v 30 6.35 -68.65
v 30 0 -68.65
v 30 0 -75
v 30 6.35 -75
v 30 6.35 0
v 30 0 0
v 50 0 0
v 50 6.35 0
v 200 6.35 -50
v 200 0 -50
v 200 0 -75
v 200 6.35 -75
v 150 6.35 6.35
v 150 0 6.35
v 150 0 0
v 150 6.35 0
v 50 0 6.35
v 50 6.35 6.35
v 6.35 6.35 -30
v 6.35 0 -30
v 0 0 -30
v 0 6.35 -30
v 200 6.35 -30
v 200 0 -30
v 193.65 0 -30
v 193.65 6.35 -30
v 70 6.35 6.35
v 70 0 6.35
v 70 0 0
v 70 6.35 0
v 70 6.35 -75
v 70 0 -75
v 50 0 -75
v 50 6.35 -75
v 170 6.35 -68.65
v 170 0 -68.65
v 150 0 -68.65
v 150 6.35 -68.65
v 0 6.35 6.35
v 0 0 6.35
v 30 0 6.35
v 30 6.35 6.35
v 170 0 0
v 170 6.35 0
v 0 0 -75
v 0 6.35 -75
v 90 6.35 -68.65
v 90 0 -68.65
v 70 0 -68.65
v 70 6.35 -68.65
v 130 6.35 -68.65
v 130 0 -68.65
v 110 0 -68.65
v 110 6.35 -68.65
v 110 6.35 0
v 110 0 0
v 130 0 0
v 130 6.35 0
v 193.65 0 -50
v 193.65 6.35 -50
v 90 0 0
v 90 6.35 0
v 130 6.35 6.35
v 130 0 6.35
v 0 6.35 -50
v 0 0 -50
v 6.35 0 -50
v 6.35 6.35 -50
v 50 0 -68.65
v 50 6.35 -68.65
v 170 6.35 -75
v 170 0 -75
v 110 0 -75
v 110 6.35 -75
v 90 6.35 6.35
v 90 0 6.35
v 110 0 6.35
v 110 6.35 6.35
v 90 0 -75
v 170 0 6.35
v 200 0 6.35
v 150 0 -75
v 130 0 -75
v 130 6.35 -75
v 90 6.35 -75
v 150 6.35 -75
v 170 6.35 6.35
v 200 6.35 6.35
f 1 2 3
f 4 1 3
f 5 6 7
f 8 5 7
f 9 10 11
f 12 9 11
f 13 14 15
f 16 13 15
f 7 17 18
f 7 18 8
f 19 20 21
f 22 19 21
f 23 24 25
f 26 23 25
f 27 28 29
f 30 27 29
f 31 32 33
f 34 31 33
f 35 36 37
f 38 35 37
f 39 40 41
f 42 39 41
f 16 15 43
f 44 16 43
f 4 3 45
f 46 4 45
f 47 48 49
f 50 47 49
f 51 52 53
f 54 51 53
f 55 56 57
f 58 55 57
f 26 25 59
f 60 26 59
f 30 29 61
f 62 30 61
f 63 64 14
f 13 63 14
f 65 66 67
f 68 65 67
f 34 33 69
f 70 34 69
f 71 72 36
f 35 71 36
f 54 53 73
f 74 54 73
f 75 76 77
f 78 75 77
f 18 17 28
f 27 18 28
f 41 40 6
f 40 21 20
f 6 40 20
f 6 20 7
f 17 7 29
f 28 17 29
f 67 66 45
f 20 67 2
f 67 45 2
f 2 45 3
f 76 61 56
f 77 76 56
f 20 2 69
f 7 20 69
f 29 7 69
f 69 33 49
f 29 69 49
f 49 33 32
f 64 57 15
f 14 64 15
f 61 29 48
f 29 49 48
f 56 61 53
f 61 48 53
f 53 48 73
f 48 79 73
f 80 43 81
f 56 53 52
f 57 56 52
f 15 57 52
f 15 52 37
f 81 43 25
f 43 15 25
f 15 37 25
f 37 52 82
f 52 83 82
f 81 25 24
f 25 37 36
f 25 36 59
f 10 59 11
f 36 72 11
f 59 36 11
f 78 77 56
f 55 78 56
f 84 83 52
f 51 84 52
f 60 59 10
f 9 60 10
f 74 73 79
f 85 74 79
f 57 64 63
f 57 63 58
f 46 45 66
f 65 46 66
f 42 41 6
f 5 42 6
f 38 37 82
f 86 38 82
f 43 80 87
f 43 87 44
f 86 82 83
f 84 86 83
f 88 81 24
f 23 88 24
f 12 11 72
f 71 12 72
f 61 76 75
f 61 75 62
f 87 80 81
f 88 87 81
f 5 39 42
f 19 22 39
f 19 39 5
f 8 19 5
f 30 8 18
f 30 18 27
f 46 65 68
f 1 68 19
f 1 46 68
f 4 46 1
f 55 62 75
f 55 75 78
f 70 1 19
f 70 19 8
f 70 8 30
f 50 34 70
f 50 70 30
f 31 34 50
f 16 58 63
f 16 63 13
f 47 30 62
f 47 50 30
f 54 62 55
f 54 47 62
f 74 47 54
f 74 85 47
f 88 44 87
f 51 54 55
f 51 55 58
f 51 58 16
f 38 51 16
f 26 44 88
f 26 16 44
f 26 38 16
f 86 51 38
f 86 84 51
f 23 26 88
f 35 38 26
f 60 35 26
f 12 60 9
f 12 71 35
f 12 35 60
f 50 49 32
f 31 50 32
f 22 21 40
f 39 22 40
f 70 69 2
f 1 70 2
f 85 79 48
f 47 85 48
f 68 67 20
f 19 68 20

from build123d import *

# Parameters (mm, degrees)
SKETCH1_W           = 30
SKETCH1_H           = 6.35
SKETCH1_W_2         = 20
BOSS_EXTRUDE1_DEPTH = 6.35


with BuildPart() as part:
    # Sketch1 → Boss-Extrude1 (new body)
    with BuildSketch(Plane(origin=(0, 0, 0), x_dir=(1, 0, 0), z_dir=(0, 1, 0))):
        Polygon((0, 30), (0, 0), (30, 0), (50, 0), (70, 0), (90, 0), (110, 0), (130, 0), (150, 0), (170, 0), (200, 0), (200, 30), (193.65, 30), (193.65, 50), (200, 50), (200, 75), (170, 75), (170, 68.65), (150, 68.65), (150, 75), (130, 75), (130, 68.65), (110, 68.65), (110, 75), (90, 75), (90, 68.65), (70, 68.65), (70, 75), (50, 75), (50, 68.65), (30, 68.65), (30, 75), (0, 75), (0, 50), (6.35, 50), (6.35, 30), align=None)
        with Locations((15, -3.175)):
            Rectangle(SKETCH1_W, SKETCH1_H)
        with Locations((60, -3.175)):
            Rectangle(SKETCH1_W_2, SKETCH1_H)
        with Locations((100, -3.175)):
            Rectangle(SKETCH1_W_2, SKETCH1_H)
        with Locations((140, -3.175)):
            Rectangle(SKETCH1_W_2, SKETCH1_H)
        with Locations((185, -3.175)):
            Rectangle(SKETCH1_W, SKETCH1_H)
    extrude(amount=BOSS_EXTRUDE1_DEPTH)


solid = part.part
